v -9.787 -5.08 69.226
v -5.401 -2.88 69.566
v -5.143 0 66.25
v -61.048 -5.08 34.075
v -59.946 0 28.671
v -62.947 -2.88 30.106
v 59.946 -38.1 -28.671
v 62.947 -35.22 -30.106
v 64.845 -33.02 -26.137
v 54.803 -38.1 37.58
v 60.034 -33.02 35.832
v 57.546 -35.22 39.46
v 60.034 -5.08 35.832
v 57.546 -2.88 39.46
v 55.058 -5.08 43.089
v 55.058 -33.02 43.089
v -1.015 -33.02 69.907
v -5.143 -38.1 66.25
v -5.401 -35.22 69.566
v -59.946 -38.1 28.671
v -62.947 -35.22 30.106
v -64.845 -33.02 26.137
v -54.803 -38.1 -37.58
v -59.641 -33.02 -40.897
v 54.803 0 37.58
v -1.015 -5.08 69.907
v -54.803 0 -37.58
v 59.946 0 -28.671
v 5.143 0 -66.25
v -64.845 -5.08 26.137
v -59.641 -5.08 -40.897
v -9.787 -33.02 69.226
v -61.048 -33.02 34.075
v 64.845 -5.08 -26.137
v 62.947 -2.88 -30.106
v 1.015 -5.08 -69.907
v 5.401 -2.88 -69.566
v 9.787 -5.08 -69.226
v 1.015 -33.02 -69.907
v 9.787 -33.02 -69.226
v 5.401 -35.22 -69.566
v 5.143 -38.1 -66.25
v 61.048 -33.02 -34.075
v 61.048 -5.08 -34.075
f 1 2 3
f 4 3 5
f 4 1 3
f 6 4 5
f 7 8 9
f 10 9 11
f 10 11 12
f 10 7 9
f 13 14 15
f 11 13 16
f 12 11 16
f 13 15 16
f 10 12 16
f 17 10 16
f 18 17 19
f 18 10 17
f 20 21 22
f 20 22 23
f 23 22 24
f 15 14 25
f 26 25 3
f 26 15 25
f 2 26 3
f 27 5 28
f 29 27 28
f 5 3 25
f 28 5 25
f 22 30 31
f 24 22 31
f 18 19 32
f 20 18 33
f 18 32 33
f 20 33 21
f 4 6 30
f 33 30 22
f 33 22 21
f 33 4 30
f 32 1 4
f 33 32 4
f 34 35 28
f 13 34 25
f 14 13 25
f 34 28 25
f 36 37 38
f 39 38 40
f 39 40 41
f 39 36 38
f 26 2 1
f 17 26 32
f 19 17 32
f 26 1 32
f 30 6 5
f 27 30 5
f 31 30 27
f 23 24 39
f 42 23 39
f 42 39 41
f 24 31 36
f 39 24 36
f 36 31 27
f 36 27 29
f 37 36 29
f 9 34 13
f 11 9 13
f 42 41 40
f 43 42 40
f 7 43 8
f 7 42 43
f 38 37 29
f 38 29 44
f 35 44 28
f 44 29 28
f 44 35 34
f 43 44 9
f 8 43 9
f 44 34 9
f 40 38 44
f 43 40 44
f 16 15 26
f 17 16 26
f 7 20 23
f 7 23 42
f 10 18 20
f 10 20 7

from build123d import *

# Parameters (mm, degrees)
F1_DEPTH = 38.1
F2_SIZE  = 5.08
F3_SIZE  = 5.08
F4_SIZE  = 5.08
F5_SIZE  = 5.08
F6_SIZE  = 5.08


# Not quite as in the source:
# - the program builds the solid bodies; features that only make, move or delete a surface that nothing else refers to are left out


with BuildPart() as f1:
    # F0 (on Front) → F1 (new body)
    with BuildSketch(Plane.XZ):
        Polygon((5.5975063319, -72.0986601401), (65.238024426, -31.2017473888), (59.6405180942, 40.8969127513), (-5.5975063319, 72.0986601401), (-65.238024426, 31.2017473888), (-59.6405180942, -40.8969127513), align=None)
    extrude(amount=F1_DEPTH)

    # F2
    f2_edges = [f1.edges().sort_by_distance(p)[0] for p in [
        (27.021506, -38.1, 56.497786),
    ]]
    chamfer(f2_edges, length=F2_SIZE)

    # F3
    f3_edges = [f1.edges().sort_by_distance(p)[0] for p in [
        (62.666292, -38.1, 1.923443),
    ]]
    chamfer(f3_edges, length=F3_SIZE)

    # F4
    f4_edges = [f1.edges().sort_by_distance(p)[0] for p in [
        (-62.439271, 0, -4.847583),
        (62.439271, 0, 4.847583),
        (-27.021506, 0, -56.497786),
        (32.998896, -38.1, -53.30888),
        (-35.417765, 0, 51.650204),
        (-27.021506, -38.1, -56.497786),
        (27.021506, 0, 56.497786),
        (-62.439271, -38.1, -4.847583),
        (35.417765, 0, -51.650204),
        (-37.836635, -38.1, 49.991528),
    ]]
    chamfer(f4_edges, length=F4_SIZE)

    # F5
    f5_edges = [f1.edges().sort_by_distance(p)[0] for p in [
        (5.597506, -19.05, -72.09866),
    ]]
    chamfer(f5_edges, length=F5_SIZE)

    # F6
    f6_edges = [f1.edges().sort_by_distance(p)[0] for p in [
        (-5.597506, -19.05, 72.09866),
        (-65.238024, -19.05, 31.201747),
        (65.238024, -19.05, -31.201747),
        (59.640518, -19.05, 40.896913),
    ]]
    chamfer(f6_edges, length=F6_SIZE)


solid = f1.part
